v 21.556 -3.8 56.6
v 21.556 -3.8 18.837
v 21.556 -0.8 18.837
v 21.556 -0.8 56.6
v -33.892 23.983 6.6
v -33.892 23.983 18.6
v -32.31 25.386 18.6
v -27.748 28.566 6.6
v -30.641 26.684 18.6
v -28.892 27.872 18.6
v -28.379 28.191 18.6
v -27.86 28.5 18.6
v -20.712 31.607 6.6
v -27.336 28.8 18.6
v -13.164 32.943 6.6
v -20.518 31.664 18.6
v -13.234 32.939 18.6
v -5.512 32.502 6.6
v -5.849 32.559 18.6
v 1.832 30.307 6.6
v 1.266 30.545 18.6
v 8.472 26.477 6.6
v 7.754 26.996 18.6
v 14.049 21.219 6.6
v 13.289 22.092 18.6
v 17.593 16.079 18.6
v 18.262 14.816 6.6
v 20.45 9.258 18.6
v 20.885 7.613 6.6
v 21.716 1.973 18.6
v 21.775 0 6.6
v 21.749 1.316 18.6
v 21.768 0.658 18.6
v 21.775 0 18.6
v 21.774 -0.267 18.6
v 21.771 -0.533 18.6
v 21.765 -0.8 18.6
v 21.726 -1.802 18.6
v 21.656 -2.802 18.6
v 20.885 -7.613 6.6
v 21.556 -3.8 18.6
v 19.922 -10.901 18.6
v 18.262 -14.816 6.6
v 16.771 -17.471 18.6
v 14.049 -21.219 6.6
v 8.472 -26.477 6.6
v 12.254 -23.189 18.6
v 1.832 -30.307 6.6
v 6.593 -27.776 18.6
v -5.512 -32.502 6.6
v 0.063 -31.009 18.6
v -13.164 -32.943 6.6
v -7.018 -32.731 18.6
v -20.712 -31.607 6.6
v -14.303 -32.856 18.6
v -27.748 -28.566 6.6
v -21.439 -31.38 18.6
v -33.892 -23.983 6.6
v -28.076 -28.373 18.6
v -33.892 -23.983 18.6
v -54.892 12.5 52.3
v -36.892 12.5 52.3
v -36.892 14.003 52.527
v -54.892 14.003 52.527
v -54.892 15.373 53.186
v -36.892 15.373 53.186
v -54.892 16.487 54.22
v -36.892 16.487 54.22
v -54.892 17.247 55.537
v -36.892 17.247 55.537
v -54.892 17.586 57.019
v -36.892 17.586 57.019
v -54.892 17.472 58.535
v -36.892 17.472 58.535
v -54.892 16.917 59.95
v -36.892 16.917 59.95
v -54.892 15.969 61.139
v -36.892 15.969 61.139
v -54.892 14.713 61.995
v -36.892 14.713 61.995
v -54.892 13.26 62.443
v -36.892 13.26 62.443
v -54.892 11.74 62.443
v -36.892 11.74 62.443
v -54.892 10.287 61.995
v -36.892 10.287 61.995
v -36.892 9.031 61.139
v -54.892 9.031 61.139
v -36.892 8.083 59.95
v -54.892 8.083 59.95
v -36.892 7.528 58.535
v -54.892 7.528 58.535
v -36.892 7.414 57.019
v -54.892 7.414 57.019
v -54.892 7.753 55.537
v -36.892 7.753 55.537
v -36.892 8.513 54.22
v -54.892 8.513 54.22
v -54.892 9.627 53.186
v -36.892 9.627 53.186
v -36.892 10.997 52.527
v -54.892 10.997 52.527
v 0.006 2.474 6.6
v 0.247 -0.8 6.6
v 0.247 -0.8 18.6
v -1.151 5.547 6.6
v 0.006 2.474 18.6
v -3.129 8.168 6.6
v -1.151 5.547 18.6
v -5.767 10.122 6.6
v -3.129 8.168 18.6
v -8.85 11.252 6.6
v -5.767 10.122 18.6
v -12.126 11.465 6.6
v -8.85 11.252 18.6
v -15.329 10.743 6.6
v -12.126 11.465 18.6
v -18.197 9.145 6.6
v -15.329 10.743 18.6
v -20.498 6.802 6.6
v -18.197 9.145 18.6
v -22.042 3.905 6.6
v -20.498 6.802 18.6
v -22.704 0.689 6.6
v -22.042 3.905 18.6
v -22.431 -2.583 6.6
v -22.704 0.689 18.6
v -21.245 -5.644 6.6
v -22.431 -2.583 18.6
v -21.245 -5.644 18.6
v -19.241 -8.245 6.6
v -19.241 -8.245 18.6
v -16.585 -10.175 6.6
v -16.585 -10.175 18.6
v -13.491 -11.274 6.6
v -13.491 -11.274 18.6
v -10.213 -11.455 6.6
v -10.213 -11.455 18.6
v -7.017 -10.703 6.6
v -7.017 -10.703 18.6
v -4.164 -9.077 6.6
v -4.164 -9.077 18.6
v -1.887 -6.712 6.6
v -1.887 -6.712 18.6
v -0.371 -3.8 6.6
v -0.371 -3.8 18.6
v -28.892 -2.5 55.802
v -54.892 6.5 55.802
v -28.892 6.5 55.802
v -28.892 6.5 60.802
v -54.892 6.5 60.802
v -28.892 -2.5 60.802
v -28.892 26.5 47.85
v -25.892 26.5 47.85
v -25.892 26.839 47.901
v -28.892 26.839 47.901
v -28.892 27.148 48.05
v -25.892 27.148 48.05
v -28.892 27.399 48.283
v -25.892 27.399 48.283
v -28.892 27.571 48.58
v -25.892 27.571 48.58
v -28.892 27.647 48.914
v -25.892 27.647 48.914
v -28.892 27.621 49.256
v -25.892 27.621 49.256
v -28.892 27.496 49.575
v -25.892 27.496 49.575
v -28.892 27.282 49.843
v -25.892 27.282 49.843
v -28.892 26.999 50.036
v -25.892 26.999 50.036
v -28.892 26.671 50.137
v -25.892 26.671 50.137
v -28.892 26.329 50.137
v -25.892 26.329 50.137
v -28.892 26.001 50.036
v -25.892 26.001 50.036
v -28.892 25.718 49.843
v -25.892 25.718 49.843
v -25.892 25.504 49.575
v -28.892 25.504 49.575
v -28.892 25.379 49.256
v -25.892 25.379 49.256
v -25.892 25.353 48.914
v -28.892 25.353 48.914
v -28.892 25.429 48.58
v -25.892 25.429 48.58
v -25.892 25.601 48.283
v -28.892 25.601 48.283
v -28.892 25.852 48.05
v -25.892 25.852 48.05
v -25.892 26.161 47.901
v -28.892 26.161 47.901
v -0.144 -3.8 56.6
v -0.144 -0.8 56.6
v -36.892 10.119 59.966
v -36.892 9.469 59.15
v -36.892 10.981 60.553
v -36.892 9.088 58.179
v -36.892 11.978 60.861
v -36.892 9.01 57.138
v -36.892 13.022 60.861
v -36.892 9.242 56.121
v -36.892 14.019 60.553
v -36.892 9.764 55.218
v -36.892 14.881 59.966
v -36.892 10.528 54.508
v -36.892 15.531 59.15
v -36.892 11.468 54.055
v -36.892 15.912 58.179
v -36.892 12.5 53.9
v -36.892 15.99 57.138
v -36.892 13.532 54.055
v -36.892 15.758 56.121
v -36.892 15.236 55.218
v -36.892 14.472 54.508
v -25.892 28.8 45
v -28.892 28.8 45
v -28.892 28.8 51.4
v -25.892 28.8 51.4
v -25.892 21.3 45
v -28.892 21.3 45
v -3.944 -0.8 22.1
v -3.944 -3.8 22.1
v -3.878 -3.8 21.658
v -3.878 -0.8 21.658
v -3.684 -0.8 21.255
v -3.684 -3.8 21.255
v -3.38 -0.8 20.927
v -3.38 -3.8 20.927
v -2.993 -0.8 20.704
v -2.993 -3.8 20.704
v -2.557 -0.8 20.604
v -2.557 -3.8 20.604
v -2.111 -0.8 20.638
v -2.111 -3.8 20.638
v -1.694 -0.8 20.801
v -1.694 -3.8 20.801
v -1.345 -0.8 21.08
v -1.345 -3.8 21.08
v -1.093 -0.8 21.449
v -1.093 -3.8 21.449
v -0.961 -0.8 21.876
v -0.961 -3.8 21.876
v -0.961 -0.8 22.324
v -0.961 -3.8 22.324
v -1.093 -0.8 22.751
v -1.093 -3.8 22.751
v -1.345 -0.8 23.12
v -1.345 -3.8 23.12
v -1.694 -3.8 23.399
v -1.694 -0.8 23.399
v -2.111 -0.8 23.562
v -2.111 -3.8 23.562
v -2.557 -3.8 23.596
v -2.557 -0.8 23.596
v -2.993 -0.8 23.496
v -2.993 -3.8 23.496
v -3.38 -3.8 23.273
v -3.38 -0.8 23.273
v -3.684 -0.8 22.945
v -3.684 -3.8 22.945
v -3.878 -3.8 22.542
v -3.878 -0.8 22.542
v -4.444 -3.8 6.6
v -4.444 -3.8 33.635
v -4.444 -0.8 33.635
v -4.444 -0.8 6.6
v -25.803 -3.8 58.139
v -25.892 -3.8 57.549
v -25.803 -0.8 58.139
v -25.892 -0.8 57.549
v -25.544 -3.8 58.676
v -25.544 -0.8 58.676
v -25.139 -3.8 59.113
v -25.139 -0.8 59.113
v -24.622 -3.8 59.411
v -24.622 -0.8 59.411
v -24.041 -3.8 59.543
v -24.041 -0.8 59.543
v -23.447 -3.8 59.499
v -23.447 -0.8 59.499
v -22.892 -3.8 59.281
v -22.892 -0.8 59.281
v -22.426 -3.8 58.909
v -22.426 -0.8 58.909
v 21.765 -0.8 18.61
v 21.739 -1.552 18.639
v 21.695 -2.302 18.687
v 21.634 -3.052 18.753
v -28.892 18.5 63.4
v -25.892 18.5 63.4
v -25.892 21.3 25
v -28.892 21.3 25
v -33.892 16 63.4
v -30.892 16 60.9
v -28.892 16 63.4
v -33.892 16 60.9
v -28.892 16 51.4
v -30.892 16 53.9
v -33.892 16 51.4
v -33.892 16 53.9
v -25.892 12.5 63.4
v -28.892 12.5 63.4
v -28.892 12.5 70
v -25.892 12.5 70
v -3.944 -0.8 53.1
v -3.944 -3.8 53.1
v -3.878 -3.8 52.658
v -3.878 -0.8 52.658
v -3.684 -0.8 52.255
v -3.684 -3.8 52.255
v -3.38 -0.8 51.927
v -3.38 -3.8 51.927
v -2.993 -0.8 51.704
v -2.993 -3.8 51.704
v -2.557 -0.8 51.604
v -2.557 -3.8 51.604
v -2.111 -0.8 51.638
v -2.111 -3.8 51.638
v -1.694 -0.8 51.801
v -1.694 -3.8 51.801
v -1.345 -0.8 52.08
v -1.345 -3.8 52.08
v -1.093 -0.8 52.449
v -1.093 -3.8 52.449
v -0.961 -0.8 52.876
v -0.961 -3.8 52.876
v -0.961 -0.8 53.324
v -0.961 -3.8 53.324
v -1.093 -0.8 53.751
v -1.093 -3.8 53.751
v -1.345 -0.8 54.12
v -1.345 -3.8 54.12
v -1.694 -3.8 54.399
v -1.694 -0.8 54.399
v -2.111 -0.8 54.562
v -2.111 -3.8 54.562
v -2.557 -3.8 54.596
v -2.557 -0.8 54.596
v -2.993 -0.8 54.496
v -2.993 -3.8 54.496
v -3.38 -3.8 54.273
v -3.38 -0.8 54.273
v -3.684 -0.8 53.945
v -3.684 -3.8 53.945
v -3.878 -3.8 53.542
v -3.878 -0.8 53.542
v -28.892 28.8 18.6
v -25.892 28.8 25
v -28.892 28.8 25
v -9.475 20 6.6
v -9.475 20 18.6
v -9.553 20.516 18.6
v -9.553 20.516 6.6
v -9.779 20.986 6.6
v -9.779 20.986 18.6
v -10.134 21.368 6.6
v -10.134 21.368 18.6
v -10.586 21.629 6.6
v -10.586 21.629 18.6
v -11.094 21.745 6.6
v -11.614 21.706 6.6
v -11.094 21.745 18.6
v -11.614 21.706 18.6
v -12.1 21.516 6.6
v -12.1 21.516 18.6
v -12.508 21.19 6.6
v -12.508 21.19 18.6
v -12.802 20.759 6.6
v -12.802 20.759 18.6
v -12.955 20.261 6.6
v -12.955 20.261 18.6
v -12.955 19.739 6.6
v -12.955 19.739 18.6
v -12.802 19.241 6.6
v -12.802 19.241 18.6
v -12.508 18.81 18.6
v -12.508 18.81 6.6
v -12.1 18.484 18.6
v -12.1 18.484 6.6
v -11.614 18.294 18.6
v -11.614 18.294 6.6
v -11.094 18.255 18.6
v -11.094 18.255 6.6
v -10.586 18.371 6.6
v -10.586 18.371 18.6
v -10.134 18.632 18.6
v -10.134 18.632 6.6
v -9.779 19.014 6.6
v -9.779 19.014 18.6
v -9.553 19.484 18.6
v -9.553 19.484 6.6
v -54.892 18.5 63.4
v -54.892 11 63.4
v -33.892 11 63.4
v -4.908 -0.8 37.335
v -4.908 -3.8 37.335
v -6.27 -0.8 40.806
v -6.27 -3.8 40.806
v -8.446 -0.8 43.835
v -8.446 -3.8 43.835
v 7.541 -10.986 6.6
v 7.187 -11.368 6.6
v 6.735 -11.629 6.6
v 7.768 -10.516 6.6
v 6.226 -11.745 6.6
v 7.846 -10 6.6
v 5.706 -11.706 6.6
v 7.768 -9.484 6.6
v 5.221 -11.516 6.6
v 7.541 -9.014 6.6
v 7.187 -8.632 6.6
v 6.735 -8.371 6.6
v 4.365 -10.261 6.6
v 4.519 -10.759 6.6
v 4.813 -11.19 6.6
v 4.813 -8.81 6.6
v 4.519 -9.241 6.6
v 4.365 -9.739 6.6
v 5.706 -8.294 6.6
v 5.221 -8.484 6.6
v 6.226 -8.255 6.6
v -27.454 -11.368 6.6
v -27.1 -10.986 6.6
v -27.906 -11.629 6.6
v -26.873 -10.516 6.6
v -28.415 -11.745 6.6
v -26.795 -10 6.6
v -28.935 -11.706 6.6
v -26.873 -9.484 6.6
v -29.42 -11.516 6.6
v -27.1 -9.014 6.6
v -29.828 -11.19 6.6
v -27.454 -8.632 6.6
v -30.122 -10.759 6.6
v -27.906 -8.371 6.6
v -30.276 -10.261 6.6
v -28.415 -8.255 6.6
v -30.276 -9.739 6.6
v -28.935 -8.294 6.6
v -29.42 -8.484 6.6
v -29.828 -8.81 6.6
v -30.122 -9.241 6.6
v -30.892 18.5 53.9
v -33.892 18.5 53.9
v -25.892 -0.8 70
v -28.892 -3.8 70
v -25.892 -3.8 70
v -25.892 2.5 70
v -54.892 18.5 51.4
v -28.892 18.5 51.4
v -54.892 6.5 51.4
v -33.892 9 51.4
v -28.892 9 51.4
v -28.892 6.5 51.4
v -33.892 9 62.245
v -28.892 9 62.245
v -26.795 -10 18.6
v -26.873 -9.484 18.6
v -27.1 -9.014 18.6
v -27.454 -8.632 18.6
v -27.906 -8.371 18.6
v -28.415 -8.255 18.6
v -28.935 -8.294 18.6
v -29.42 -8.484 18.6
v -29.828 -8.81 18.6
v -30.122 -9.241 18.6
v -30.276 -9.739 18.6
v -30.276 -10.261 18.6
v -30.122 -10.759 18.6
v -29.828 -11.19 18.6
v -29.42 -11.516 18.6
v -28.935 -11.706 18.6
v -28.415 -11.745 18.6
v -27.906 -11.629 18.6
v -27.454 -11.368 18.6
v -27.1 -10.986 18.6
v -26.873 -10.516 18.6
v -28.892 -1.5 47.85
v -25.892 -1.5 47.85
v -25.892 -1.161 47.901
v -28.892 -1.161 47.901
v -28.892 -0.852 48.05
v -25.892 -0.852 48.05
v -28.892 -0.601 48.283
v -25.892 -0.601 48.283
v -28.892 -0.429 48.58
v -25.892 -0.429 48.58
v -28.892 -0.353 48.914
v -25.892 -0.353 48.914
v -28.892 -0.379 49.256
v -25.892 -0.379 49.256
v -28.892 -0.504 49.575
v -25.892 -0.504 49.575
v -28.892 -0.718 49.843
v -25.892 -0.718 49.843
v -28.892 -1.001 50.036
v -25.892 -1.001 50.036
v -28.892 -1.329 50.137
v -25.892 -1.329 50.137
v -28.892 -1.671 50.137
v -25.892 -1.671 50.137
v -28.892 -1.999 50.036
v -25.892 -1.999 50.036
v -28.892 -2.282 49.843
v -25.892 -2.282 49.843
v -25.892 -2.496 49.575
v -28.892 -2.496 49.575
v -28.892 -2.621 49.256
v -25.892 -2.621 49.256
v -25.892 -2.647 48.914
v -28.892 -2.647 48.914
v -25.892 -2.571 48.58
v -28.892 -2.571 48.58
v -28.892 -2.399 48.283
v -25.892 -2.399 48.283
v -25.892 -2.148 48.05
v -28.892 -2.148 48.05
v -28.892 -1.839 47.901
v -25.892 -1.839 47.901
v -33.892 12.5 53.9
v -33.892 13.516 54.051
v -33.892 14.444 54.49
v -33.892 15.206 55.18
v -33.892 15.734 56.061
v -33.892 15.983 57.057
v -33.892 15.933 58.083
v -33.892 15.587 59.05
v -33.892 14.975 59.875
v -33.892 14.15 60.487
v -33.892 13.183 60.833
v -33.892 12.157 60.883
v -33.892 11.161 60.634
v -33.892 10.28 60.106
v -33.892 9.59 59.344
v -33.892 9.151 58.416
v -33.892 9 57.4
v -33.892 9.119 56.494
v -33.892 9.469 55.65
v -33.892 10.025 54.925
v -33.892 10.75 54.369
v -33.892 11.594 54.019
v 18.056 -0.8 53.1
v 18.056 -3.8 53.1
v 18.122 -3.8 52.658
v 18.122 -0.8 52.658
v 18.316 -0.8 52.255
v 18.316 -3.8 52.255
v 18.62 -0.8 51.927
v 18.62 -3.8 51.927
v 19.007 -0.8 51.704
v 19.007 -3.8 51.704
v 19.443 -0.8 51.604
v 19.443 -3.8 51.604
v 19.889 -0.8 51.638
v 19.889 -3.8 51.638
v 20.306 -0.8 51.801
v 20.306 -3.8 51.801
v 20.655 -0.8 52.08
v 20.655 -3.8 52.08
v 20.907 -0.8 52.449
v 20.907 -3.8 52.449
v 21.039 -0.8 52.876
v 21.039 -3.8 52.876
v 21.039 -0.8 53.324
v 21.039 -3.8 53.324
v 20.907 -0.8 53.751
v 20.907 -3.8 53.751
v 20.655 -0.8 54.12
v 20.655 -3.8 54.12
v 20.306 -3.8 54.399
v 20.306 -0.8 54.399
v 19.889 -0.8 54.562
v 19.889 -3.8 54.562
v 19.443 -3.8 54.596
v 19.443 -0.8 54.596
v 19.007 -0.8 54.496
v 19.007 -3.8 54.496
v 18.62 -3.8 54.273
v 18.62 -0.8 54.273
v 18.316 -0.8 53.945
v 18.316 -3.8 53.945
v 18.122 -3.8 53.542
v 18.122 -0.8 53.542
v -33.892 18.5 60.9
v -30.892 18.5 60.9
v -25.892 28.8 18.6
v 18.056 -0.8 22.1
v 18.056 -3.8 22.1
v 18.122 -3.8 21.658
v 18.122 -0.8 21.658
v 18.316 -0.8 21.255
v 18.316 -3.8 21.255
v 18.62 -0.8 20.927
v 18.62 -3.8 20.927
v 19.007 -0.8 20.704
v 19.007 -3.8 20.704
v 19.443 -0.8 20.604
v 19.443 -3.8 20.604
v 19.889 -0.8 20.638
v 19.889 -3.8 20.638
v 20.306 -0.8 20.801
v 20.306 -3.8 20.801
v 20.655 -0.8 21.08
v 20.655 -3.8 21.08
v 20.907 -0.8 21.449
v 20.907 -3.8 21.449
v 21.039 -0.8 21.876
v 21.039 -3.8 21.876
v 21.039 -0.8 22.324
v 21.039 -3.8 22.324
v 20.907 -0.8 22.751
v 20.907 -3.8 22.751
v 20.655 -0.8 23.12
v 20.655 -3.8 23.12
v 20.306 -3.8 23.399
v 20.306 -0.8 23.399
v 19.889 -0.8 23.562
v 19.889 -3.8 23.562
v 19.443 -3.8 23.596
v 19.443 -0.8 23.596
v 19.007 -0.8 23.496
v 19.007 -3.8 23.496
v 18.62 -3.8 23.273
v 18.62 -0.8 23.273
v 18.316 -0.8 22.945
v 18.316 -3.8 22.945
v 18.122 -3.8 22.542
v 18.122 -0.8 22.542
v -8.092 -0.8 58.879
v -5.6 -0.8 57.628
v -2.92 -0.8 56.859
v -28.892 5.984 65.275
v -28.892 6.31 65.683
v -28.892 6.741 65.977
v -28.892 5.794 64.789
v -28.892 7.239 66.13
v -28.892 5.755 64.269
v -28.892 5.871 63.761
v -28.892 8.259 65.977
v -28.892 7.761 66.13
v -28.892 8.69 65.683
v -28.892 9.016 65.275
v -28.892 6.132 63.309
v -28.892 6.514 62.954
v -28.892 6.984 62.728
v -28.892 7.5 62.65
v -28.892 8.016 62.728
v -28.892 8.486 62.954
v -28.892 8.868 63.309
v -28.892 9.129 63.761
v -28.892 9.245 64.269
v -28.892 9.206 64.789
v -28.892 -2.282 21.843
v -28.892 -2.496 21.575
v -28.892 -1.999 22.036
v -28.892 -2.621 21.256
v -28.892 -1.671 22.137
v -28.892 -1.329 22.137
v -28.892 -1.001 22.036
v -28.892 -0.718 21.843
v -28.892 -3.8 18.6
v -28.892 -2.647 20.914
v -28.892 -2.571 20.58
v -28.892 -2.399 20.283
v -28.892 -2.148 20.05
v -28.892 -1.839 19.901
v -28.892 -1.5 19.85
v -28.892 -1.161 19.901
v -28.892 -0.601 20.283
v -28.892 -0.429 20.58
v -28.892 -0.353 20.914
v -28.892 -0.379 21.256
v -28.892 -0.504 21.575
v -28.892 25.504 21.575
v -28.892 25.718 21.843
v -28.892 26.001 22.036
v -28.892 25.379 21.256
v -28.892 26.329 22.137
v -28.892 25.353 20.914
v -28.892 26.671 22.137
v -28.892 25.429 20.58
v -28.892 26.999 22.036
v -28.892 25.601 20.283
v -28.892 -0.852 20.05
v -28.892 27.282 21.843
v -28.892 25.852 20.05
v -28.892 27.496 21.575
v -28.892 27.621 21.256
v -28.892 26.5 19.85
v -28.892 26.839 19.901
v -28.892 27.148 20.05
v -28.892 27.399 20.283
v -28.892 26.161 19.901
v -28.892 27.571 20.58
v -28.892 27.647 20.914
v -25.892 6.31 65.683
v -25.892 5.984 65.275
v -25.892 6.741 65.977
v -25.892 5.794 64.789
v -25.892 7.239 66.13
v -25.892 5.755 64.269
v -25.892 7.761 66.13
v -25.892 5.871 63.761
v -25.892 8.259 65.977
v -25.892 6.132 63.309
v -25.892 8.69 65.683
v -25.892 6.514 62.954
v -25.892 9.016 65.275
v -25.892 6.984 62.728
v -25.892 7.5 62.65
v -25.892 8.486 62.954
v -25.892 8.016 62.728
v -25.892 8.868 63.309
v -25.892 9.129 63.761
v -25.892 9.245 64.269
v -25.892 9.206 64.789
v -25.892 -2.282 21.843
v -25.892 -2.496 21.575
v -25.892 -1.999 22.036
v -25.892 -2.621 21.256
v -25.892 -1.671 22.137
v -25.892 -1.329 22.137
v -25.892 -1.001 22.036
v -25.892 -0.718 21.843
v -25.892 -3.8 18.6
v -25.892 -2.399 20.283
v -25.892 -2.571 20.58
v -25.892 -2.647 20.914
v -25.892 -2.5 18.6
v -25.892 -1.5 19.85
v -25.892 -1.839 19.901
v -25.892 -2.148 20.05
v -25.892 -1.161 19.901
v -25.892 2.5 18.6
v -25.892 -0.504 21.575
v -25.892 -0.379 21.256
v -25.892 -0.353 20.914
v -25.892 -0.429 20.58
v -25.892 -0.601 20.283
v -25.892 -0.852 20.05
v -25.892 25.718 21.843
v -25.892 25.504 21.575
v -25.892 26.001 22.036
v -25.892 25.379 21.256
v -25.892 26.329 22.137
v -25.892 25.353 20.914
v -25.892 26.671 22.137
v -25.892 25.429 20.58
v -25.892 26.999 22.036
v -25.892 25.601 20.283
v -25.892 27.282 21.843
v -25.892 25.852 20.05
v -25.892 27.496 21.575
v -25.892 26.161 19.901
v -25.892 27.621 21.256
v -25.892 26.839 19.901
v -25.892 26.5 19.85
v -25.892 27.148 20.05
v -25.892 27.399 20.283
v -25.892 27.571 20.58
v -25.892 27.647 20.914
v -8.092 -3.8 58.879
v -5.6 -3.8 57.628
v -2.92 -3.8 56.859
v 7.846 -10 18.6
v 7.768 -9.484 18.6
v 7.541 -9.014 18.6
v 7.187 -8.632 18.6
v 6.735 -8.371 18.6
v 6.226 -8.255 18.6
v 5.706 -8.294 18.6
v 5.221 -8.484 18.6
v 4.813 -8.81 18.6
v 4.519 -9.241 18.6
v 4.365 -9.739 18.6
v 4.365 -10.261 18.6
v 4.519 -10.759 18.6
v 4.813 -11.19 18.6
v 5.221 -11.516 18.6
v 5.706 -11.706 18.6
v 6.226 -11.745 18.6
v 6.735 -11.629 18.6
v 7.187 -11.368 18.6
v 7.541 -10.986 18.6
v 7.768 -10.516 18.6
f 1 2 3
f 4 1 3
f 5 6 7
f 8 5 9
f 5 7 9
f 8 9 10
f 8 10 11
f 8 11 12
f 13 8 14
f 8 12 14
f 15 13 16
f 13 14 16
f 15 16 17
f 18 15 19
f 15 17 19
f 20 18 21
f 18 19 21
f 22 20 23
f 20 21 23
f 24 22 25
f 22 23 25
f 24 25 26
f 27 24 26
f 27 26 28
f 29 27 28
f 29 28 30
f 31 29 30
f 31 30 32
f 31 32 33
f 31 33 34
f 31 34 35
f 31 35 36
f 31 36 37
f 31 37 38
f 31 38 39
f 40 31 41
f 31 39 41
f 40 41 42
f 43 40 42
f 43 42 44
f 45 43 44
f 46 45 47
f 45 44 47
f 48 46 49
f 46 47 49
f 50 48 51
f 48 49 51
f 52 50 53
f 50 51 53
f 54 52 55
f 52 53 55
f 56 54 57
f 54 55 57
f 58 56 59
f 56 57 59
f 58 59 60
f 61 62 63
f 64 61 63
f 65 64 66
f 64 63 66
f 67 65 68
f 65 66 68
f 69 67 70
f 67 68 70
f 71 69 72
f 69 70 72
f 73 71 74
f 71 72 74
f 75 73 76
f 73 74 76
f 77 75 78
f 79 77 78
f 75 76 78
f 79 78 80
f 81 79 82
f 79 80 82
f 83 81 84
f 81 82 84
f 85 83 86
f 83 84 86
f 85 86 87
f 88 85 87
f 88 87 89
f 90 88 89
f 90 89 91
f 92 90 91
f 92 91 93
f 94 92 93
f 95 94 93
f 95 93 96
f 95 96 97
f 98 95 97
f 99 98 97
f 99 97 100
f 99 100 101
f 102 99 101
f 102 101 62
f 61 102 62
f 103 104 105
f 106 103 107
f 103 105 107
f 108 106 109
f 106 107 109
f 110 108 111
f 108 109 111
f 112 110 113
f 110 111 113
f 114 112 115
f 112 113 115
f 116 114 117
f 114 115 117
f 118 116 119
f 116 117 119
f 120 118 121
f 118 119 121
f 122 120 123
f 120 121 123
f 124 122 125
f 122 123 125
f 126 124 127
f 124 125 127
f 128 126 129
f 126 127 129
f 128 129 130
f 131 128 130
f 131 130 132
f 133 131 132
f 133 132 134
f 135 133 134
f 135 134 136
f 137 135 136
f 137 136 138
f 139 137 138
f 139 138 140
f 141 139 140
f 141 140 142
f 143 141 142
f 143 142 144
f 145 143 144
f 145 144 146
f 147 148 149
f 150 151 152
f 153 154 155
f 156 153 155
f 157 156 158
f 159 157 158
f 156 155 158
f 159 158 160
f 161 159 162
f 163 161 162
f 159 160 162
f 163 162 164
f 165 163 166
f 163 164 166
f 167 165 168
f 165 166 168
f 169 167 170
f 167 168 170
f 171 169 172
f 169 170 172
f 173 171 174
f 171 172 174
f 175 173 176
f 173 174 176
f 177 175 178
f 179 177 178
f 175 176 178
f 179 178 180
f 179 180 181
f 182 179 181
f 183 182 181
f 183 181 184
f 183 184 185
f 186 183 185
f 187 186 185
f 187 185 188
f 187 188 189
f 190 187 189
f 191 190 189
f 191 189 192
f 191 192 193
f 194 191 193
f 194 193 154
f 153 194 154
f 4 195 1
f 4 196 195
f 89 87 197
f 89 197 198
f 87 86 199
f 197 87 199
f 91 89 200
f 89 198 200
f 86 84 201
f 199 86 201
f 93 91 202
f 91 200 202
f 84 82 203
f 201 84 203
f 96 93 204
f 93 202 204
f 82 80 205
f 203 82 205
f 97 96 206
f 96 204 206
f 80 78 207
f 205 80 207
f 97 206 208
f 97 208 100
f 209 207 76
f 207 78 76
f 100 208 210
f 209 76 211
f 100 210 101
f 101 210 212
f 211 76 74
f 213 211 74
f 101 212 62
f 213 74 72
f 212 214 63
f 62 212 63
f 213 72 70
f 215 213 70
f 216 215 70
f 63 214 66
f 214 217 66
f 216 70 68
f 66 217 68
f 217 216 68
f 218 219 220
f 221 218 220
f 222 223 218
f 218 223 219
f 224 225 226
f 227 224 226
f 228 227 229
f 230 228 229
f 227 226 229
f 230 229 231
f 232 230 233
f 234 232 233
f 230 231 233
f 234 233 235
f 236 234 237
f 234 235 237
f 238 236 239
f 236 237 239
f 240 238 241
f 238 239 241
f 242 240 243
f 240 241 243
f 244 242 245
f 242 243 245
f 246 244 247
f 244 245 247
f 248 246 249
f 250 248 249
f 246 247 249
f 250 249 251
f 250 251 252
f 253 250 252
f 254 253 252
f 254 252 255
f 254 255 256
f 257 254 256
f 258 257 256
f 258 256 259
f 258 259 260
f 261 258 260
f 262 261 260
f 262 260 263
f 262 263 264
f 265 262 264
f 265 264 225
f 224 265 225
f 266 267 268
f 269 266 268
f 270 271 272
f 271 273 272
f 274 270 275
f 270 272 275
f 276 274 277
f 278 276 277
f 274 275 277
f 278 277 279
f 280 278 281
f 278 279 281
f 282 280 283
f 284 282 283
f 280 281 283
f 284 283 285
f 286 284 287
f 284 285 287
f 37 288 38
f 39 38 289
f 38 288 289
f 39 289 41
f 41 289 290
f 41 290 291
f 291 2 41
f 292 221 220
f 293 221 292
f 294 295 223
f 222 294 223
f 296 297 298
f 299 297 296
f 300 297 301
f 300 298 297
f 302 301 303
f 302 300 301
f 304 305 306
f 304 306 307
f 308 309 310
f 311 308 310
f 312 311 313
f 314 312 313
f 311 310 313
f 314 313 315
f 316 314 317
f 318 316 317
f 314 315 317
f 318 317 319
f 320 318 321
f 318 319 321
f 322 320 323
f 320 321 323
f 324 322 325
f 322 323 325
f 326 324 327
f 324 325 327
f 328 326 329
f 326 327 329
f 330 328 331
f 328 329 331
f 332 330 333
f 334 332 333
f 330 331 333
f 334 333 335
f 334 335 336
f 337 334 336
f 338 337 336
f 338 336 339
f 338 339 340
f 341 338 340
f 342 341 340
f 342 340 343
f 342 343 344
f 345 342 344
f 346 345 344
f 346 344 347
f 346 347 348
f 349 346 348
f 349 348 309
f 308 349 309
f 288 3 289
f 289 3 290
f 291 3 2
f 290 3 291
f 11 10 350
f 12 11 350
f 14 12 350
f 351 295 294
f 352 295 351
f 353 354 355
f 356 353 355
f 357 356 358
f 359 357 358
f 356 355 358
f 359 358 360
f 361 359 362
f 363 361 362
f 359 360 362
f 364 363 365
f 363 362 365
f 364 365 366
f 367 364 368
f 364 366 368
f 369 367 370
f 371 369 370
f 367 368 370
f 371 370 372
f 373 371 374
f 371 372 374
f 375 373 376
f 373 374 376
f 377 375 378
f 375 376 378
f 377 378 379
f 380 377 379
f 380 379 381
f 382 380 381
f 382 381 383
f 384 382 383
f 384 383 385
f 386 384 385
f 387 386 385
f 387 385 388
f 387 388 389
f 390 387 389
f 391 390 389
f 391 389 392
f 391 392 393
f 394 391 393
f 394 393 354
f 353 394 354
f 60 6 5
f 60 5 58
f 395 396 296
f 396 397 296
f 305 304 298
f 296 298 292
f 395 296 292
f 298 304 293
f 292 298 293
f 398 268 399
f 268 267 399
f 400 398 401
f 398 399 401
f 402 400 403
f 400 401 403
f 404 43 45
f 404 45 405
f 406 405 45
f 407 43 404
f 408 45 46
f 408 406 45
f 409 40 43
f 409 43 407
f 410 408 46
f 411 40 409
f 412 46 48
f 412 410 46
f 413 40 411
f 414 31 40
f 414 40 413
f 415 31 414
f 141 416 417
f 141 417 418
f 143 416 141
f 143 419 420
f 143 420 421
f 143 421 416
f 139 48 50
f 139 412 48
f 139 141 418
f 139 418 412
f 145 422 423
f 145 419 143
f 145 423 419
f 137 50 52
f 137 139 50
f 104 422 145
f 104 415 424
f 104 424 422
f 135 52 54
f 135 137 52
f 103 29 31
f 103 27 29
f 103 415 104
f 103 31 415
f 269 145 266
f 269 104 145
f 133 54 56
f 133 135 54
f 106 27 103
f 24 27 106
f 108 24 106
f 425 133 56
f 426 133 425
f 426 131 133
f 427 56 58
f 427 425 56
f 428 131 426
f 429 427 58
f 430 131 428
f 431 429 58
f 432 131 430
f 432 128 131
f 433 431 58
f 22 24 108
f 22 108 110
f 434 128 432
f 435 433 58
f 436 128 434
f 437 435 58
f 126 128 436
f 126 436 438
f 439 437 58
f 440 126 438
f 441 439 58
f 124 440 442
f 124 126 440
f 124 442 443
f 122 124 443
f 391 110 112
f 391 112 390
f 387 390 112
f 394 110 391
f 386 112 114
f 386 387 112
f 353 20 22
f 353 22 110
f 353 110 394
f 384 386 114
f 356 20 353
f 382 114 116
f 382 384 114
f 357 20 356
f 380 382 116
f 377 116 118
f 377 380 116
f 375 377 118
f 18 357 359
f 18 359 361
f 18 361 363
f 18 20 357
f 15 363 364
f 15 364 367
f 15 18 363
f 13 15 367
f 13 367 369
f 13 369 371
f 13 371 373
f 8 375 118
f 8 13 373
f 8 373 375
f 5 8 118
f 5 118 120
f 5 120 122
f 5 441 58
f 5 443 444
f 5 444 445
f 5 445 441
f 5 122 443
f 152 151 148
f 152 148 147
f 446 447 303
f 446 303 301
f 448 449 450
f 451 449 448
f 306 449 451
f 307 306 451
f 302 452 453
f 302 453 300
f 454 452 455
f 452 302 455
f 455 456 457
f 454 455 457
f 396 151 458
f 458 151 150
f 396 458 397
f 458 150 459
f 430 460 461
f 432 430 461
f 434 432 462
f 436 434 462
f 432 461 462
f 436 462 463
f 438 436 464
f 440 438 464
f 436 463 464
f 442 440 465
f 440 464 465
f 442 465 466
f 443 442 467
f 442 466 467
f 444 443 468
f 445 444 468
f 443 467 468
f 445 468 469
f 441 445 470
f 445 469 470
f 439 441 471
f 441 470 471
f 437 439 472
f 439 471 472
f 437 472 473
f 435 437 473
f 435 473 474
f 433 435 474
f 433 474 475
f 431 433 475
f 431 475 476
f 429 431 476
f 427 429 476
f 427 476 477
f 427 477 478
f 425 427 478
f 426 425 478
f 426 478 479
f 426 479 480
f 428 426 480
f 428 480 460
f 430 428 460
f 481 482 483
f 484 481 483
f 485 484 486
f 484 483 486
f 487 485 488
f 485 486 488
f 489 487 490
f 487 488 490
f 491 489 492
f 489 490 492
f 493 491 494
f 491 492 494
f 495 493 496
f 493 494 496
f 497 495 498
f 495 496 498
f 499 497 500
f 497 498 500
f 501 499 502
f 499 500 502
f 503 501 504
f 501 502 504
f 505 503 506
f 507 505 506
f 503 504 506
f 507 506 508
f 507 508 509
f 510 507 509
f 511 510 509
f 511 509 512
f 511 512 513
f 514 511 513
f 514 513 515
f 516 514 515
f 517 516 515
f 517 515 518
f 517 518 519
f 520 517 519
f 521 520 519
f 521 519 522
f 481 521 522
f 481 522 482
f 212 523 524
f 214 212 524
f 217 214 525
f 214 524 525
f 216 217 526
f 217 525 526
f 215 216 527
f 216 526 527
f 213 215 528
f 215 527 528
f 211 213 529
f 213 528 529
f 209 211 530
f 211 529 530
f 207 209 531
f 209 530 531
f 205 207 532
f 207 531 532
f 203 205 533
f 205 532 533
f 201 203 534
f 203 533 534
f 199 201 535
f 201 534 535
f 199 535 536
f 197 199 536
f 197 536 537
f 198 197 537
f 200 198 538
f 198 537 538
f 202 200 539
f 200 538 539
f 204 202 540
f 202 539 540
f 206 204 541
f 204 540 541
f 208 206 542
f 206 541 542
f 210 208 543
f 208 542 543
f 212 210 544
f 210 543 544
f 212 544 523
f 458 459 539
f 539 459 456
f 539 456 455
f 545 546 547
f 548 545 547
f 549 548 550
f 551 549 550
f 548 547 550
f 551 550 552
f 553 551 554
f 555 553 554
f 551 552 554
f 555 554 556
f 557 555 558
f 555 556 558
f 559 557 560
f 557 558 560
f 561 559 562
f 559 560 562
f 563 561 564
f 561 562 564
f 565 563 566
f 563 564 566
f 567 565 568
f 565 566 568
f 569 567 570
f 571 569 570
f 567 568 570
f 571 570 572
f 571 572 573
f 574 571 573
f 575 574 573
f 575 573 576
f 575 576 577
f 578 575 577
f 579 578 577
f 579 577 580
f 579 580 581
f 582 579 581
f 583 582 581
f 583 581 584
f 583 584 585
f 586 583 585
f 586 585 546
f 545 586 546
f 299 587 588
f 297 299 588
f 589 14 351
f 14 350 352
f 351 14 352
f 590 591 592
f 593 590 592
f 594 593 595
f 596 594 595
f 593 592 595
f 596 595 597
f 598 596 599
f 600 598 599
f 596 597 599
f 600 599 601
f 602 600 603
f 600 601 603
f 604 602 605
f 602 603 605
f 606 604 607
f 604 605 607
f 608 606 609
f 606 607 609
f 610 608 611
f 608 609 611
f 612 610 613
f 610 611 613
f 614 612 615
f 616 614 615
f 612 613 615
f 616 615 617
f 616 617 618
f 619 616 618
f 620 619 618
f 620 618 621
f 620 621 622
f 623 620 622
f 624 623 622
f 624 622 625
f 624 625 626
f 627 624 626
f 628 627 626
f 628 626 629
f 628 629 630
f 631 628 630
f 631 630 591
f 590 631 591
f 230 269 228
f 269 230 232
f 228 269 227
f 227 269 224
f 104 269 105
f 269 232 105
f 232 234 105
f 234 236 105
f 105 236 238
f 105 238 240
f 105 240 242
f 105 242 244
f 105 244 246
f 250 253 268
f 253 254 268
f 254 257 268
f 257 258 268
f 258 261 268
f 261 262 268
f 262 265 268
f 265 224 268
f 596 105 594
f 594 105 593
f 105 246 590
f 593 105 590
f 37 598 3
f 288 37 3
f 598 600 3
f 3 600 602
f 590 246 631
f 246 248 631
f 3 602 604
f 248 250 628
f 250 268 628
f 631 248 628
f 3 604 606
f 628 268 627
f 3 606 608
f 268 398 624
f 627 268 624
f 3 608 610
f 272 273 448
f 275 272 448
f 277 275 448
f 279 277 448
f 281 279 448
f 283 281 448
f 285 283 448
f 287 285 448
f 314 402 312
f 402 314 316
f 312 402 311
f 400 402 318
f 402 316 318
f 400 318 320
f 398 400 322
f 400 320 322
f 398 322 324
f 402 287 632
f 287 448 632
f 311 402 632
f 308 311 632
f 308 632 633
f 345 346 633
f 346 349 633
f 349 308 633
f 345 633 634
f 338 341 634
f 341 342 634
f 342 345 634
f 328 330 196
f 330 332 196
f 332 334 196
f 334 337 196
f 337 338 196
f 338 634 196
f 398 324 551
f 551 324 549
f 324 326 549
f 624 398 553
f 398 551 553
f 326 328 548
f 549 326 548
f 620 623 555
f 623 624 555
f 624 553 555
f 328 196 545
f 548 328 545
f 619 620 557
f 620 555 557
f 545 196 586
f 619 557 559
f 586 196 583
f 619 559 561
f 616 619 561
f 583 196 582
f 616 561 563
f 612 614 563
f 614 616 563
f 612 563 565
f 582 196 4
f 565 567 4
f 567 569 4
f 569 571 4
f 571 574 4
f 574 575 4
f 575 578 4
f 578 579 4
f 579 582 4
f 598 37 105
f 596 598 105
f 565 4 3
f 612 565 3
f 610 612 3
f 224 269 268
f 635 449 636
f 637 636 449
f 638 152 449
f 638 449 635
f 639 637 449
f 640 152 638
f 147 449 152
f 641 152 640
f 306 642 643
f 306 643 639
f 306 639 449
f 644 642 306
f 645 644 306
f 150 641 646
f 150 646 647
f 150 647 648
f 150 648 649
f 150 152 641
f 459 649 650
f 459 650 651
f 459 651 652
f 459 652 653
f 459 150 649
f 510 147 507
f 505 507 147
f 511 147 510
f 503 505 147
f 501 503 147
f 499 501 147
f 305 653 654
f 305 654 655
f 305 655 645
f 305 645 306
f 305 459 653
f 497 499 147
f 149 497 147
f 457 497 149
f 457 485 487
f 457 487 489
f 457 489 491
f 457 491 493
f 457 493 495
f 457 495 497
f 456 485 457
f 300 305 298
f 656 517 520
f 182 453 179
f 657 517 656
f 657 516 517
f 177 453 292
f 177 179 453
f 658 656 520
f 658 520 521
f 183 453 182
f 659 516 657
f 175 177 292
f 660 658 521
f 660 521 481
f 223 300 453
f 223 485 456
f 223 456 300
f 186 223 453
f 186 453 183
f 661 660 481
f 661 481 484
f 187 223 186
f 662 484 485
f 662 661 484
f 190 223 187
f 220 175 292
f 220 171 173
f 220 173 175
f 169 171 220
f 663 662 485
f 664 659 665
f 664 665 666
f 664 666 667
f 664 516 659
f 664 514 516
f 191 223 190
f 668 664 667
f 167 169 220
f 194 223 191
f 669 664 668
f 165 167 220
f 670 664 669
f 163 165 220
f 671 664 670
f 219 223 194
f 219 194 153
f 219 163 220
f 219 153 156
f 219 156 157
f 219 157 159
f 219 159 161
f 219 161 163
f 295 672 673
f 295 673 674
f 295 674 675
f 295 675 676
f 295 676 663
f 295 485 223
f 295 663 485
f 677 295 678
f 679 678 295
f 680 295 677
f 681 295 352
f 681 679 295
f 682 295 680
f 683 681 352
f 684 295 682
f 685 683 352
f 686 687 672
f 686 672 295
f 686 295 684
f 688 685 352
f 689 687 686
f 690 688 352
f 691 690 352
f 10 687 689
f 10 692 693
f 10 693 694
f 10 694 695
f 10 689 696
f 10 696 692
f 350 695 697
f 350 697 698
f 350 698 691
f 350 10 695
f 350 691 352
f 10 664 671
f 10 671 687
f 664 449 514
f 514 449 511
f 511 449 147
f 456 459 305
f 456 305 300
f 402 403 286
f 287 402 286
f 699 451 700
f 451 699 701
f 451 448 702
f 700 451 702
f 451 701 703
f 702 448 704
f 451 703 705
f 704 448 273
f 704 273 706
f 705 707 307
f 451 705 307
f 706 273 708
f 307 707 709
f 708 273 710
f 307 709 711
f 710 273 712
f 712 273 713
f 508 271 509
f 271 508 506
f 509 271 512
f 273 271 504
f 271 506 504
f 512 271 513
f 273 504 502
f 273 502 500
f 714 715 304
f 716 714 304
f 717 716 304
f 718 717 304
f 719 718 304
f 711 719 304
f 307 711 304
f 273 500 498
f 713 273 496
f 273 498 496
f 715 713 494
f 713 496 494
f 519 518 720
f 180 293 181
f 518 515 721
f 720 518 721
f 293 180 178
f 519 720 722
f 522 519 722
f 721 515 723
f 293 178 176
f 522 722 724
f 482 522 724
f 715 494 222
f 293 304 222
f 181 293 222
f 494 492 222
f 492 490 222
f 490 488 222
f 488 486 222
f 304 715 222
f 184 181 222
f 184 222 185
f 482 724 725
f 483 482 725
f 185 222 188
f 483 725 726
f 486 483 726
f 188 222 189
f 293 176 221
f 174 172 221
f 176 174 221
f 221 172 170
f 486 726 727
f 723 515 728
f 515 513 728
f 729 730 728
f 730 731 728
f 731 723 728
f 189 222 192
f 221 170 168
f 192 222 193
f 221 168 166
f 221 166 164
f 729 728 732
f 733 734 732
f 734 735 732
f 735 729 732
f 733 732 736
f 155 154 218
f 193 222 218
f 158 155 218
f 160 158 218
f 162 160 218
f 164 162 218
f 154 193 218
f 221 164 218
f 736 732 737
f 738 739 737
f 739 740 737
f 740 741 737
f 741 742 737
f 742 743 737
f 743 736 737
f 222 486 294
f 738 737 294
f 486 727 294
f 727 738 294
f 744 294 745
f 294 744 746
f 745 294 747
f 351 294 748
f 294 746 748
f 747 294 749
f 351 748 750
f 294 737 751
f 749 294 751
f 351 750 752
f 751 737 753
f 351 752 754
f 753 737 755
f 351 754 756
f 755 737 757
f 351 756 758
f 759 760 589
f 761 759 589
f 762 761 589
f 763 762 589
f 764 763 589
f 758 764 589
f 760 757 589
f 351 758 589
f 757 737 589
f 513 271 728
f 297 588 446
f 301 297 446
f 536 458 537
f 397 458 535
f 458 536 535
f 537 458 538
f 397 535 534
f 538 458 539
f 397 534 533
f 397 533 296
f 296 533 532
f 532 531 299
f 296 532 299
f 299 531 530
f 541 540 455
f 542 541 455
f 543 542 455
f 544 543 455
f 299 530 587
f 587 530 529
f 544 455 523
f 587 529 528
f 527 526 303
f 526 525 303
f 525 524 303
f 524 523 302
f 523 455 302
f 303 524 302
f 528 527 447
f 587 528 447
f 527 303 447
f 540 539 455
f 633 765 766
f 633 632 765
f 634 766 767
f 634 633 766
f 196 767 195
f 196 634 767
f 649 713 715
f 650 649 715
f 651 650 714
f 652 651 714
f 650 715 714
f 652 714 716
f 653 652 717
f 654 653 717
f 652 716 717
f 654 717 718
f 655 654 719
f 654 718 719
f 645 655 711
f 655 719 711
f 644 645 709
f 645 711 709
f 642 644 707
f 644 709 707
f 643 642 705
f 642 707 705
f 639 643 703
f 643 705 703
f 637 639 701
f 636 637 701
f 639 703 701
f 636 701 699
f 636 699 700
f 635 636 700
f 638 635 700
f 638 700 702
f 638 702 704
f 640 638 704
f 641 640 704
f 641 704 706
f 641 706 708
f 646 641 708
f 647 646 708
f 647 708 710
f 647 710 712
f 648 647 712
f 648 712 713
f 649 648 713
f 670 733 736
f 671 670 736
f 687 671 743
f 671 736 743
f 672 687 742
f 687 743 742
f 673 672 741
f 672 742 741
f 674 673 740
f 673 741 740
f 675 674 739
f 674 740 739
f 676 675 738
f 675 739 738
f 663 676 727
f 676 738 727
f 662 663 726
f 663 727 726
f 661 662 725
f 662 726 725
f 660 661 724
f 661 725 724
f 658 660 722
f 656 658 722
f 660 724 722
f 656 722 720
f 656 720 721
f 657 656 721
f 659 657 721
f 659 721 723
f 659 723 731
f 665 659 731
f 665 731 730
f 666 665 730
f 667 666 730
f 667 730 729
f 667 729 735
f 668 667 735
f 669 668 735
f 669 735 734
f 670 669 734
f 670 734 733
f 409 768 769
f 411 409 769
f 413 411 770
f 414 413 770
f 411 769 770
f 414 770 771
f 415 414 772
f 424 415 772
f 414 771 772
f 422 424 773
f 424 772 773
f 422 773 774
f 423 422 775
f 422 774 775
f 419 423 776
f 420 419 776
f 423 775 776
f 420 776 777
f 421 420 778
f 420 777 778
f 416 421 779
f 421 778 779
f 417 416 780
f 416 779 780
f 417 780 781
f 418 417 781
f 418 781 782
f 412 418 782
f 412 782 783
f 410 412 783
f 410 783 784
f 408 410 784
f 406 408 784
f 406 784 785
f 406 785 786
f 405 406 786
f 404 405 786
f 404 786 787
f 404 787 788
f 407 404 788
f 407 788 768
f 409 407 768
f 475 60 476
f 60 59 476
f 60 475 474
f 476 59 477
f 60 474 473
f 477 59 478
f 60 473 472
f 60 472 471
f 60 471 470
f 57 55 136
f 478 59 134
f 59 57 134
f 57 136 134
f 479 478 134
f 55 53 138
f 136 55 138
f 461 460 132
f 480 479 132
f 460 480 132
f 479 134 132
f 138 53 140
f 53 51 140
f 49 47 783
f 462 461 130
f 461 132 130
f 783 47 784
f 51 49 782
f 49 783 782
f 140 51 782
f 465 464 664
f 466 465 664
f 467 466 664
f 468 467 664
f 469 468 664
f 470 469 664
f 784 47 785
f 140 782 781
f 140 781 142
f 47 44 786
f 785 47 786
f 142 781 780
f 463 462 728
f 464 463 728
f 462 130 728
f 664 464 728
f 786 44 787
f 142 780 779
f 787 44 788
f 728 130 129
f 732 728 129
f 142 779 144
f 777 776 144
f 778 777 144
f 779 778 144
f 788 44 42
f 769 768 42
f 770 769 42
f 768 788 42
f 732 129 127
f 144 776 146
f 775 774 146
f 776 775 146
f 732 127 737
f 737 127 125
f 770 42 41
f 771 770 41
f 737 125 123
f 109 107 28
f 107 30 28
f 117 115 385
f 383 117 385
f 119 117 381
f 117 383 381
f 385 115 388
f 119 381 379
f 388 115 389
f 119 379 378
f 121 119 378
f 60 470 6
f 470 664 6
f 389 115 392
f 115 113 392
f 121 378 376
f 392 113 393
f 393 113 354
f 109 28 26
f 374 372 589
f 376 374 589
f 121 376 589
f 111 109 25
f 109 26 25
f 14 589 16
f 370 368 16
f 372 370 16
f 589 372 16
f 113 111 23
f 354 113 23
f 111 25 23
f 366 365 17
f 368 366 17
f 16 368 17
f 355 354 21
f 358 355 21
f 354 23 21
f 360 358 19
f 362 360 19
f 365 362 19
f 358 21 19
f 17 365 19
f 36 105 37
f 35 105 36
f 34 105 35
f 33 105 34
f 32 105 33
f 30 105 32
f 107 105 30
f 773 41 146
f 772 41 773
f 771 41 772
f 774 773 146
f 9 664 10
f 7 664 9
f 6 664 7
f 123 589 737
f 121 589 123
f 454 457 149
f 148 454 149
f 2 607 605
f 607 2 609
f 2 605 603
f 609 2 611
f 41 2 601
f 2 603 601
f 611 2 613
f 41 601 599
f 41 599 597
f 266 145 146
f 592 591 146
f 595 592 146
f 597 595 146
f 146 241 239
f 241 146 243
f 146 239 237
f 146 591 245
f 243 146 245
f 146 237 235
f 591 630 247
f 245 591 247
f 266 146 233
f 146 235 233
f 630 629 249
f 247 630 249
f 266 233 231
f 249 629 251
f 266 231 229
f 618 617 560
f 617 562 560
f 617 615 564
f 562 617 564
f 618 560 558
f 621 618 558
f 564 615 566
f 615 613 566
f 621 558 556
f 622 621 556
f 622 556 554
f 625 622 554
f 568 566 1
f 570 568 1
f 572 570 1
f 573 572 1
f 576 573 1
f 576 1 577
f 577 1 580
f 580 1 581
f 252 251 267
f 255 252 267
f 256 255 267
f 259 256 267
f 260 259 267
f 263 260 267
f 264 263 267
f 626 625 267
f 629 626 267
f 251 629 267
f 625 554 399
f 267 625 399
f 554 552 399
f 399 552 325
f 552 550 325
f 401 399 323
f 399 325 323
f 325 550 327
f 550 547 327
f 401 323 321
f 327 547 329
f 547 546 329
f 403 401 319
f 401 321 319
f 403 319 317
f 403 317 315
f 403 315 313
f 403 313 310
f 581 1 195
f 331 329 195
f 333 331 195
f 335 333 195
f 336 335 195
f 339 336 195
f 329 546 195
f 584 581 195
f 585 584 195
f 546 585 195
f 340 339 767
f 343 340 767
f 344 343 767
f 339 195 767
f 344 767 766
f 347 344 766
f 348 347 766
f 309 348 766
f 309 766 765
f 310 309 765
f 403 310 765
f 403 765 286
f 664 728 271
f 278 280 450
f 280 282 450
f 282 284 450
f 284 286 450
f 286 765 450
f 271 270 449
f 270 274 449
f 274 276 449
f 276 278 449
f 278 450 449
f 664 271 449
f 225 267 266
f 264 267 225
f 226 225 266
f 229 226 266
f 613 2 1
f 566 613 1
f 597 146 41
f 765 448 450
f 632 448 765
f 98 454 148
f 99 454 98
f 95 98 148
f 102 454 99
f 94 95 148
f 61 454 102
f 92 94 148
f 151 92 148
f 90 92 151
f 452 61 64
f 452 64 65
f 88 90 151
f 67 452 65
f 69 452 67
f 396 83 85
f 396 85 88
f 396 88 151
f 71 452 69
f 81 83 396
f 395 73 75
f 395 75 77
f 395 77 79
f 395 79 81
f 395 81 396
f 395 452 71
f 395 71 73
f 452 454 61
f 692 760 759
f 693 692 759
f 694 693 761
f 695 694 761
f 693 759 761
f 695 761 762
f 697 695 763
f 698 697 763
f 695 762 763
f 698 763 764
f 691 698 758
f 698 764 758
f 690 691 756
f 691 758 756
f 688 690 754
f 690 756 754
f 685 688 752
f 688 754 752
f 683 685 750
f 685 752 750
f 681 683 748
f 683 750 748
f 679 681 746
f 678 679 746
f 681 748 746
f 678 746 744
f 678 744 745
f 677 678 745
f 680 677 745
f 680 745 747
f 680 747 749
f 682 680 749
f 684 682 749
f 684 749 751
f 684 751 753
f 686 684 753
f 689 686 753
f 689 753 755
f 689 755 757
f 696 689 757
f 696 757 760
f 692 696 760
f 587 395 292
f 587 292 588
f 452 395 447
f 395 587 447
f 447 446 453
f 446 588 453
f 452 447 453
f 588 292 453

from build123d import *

# Parameters (mm, degrees)
SKETCH_1_R           = 29
EXTRUDE_1_DEPTH      = 5
HOLE_WIZARD_1_D      = 3.5
HOLE_WIZARD_2_D      = 23
EXTRUDE_3_DEPTH      = 65
SKETCH_9_W           = 1
SKETCH_9_H           = 5
CUT_EXTRUDE_1_DEPTH  = 10
SKETCH_10_W          = 3
SKETCH_10_H          = 65
EXTRUDE_5_DEPTH      = 10
HOLE_WIZARD_3_D      = 3.5
EXTRUDE_START        = -65
EXTRUDE_6_DEPTH      = 65
SKETCH_22_W          = 12
SKETCH_22_H          = 6
EXTRUDE_7_DEPTH      = 3
EXTRUDE_8_DEPTH      = 8
HOLE_WIZARD_5_D      = 7
HOLE_WIZARD_5_DEPTH  = 3
SKETCH_27_W          = 5
SKETCH_27_H          = 3.5
CUT_EXTRUDE_3_DEPTH  = 70.598725899
CUT_EXTRUDE_4_REACH  = 94.289
SKETCH_28_W          = 3
SKETCH_28_H          = 3.5
SKETCH_29_R          = 3.5
EXTRUDE_9_DEPTH      = 18
HOLE_WIZARD_6_D      = 10.2
HOLE_WIZARD_6_DEPTH  = 18
SKETCH_32_W          = 26
SKETCH_32_H          = 5
EXTRUDE_10_DEPTH     = 9
CUT_EXTRUDE_5_REACH  = 88.897
SKETCH_36_W          = 32.8
SKETCH_36_H          = 32.6
EXTRUDE_12_DEPTH     = 3
SKETCH_38_R          = 29
CUT_EXTRUDE_7_DEPTH  = 5
SKETCH_39_W          = 17.667068266
SKETCH_39_H          = 15
CUT_EXTRUDE_8_DEPTH  = 13.6
SKETCH_41_R          = 33
EXTRUDE_14_DEPTH     = 12
HOLE_WIZARD_8_D      = 3.5
HOLE_WIZARD_9_D      = 23
HOLE_WIZARD_10_D     = 2.3
SKETCH_53_W          = 20
SKETCH_53_H          = 15
CUT_EXTRUDE_9_DEPTH  = 3
EXTRUDE_16_DEPTH     = 3
SKETCH_56_W          = 3.442096105
SKETCH_56_H          = 51.4
CUT_EXTRUDE_10_DEPTH = 96.777795528
SKETCH_57_W          = 3
SKETCH_57_H          = 1.3
EXTRUDE_17_DEPTH     = 18.6
EXTRUDE_18_DEPTH     = 3
CUT_EXTRUDE_START    = -12
CUT_EXTRUDE_11_DEPTH = 12
SKETCH_63_W          = 26
SKETCH_63_H          = 3
EXTRUDE_21_DEPTH     = 38
HOLE_WIZARD_11_D     = 3
EXTRUDE_22_DEPTH     = 3
CUT_EXTRUDE_START_2  = 4
CUT_EXTRUDE_13_DEPTH = 4
FILLET_1_R           = 15
FILLET_2_R           = 2
EXTRUDE_23_DEPTH     = 12


with BuildPart() as part:
    # 草图1 → 凸台-拉伸1 (new body)
    with BuildSketch(Plane.XY):
        Circle(SKETCH_1_R)
    extrude(amount=EXTRUDE_1_DEPTH)

    # 孔1 (through all)
    with Locations(Plane.XY.offset(5)):
        with Locations((0, 20), (-17.320508076, -10), (17.320508076, -10)):
            Hole(HOLE_WIZARD_1_D / 2)

    # 孔2 (through all)
    with Locations(Plane.XY.offset(5)):
        with Locations((0, 0)):
            Hole(HOLE_WIZARD_2_D / 2)

    # 草图7 → 凸台-拉伸3 (add)
    with BuildSketch(Plane.XY.offset(5)):
        with BuildLine():
            Line((-28.892040426, 2.5), (-28.892040426, -2.5))
            Line((-28.892040426, -2.5), (-11.22497216, -2.5))
            ThreePointArc((-11.22497216, -2.5), (-11.5, 0), (-11.22497216, 2.5))
            Line((-11.22497216, 2.5), (-28.892040426, 2.5))
        make_face()
    extrude(amount=EXTRUDE_3_DEPTH)

    # 草图9 → 切除-拉伸1 (cut)
    with BuildSketch(Plane.XY.offset(5)):
        with Locations((-29.392040426, 0)):
            Rectangle(SKETCH_9_W, SKETCH_9_H)
    extrude(amount=-CUT_EXTRUDE_1_DEPTH, mode=Mode.SUBTRACT)

    # 草图10 → 凸台-拉伸5 (add)
    with BuildSketch(Plane(origin=(0, 2.5, 0), x_dir=(1, 0, 0), z_dir=(0, 1, 0))):
        with Locations((-27.392040426, -37.5)):
            Rectangle(SKETCH_10_W, SKETCH_10_H)
    extrude(amount=EXTRUDE_5_DEPTH)

    # 孔3 (through all)
    with Locations(Plane.ZY.offset(28.892040426)):
        with Locations((10, 7.5), (64.4, 7.5)):
            Hole(HOLE_WIZARD_3_D / 2)

    # 草图20 → 凸台-拉伸6 (add)
    with BuildSketch(Plane.XY.offset(70).offset(EXTRUDE_START)):
        with BuildLine():
            Line((-11.22497216, 2.5), (-11.22497216, -2.5))
            ThreePointArc((-11.22497216, -2.5), (-11.5, 0), (-11.22497216, 2.5))
        make_face()
    extrude(amount=EXTRUDE_6_DEPTH)

    # 草图22 → 凸台-拉伸7 (add)
    with BuildSketch(Plane.ZY.offset(28.892040426)):
        with Locations((57.4, 15.5)):
            Rectangle(SKETCH_22_W, SKETCH_22_H)
    extrude(amount=-EXTRUDE_7_DEPTH)

    # 草图23 → 凸台-拉伸8 (add)
    with BuildSketch(Plane.ZY.offset(28.892040426)):
        Polygon((51.4, 6.5), (60.801923789, 6.5), (63.4, 11), (63.4, 12.5), (63.4, 18.5), (51.4, 18.5), (51.4, 12.5), align=None)
    extrude(amount=EXTRUDE_8_DEPTH)

    # 孔5
    with Locations(Plane.ZY.offset(36.892040426)):
        with Locations((57.4, 12.5)):
            Hole(HOLE_WIZARD_5_D / 2, depth=HOLE_WIZARD_5_DEPTH)

    # 草图27 → 切除-拉伸3 (cut, through all)
    with BuildSketch(Plane(origin=(0, 0, 51.4), x_dir=(-1, 0, 0), z_dir=(0, 0, -1))):
        with Locations((31.392040426, 14.25)):
            Rectangle(SKETCH_27_W, SKETCH_27_H)
        with Locations((31.392040426, 10.75)):
            Rectangle(SKETCH_27_W, SKETCH_27_H)
    extrude(amount=-CUT_EXTRUDE_3_DEPTH, mode=Mode.SUBTRACT)

    # 草图28 → 切除-拉伸4 (cut, up to next)
    with BuildSketch(Plane(origin=(0, 18.5, 0), x_dir=(1, 0, 0), z_dir=(0, 1, 0)), mode=Mode.PRIVATE) as cut_extrude_4_sk1:
        with Locations((-32.392040426, -59.15)):
            Rectangle(SKETCH_28_W, SKETCH_28_H)
    cut_extrude_4_tool1 = extrude(cut_extrude_4_sk1.sketch, amount=-CUT_EXTRUDE_4_REACH, mode=Mode.PRIVATE) & part.part
    # 草图28 → 切除-拉伸4 (cut, up to next)
    with BuildSketch(Plane(origin=(0, 18.5, 0), x_dir=(1, 0, 0), z_dir=(0, 1, 0)), mode=Mode.PRIVATE) as cut_extrude_4_sk2:
        with Locations((-32.392040426, -55.65)):
            Rectangle(SKETCH_28_W, SKETCH_28_H)
    cut_extrude_4_tool2 = extrude(cut_extrude_4_sk2.sketch, amount=-CUT_EXTRUDE_4_REACH, mode=Mode.PRIVATE) & part.part
    add(cut_extrude_4_tool1.solids().sort_by_distance((-32.39204, 18.5, 59.15))[0], mode=Mode.SUBTRACT)
    add(cut_extrude_4_tool2.solids().sort_by_distance((-32.39204, 18.5, 55.65))[0], mode=Mode.SUBTRACT)

    # 草图29 → 凸台-拉伸9 (add)
    # profile 1 of 2: a face of its own
    with BuildSketch(Plane.ZY.offset(36.892040426)):
        Polygon((60.801923789, 6.5), (63.4, 11), (63.4, 18.5), (51.4, 18.5), (51.4, 6.5), align=None)
        with Locations((57.4, 12.5)):
            Circle(SKETCH_29_R, mode=Mode.SUBTRACT)
    # profile 2 of 2: a face of its own
    with BuildSketch(Plane.ZY.offset(36.892040426)):
        with Locations((57.4, 12.5)):
            Circle(SKETCH_29_R)
    extrude(amount=EXTRUDE_9_DEPTH)

    # 孔6
    with Locations(Plane.ZY.offset(54.892040426)):
        with Locations((57.4, 12.5)):
            Hole(HOLE_WIZARD_6_D / 2, depth=HOLE_WIZARD_6_DEPTH)

    # 草图32 → 凸台-拉伸10 (add)
    with BuildSketch(Plane.XZ.offset(-6.5)):
        with Locations((-41.892040426, 58.301923789)):
            Rectangle(SKETCH_32_W, SKETCH_32_H)
    extrude(amount=EXTRUDE_10_DEPTH)

    # 草图33 → 切除-拉伸5 (cut, up to next)
    with BuildSketch(Plane.XY.offset(60.801923789), mode=Mode.PRIVATE) as cut_extrude_5_sk1:
        Polygon((-54.892040426, 6.5), (-28.892040426, -2.5), (-54.892040426, -2.5), align=None)
    cut_extrude_5_tool1 = extrude(cut_extrude_5_sk1.sketch, amount=-CUT_EXTRUDE_5_REACH, mode=Mode.PRIVATE) & part.part
    add(cut_extrude_5_tool1.solids().sort_by_distance((-46.225374, 0.5, 60.801924))[0], mode=Mode.SUBTRACT)

    # 草图36 → 凸台-拉伸12 (add)
    with BuildSketch(Plane.ZY.offset(28.892040426)):
        with Locations((35, 12.5)):
            Rectangle(SKETCH_36_W, SKETCH_36_H)
    extrude(amount=-EXTRUDE_12_DEPTH)

    # 草图38 → 切除-拉伸7 (cut)
    with BuildSketch(Plane(origin=(0, 0, 0), x_dir=(-1, 0, 0), z_dir=(0, 0, -1))):
        Circle(SKETCH_38_R)
    extrude(amount=-CUT_EXTRUDE_7_DEPTH, mode=Mode.SUBTRACT)

    # 草图39 → 切除-拉伸8 (cut)
    with BuildSketch(Plane(origin=(0, 0, 5), x_dir=(-1, 0, 0), z_dir=(0, 0, -1))):
        with Locations((20.058506293, 5)):
            Rectangle(SKETCH_39_W, SKETCH_39_H)
    extrude(amount=-CUT_EXTRUDE_8_DEPTH, mode=Mode.SUBTRACT)

    # 草图41 → 凸台-拉伸14 (add)
    with BuildSketch(Plane(origin=(0, 0, 18.6), x_dir=(-1, 0, 0), z_dir=(0, 0, -1))):
        with Locations(Location((11.22497216, 0, 0), (0, 0, 57.631283974))):
            Circle(SKETCH_41_R)
    extrude(amount=EXTRUDE_14_DEPTH)

    # 孔8 (through all)
    with Locations(Plane(origin=(0, 0, 6.6), x_dir=(-1, 0, 0), z_dir=(0, 0, -1))):
        with Locations((11.22497216, 20), (-6.095535915, -10), (28.545480236, -10)):
            Hole(HOLE_WIZARD_8_D / 2)

    # 孔9 (through all)
    with Locations(Plane(origin=(0, 0, 6.6), x_dir=(-1, 0, 0), z_dir=(0, 0, -1))):
        with Locations((11.22497216, 0)):
            Hole(HOLE_WIZARD_9_D / 2)

    # 孔10 (through all)
    with Locations(Plane.ZY.offset(28.892040426)):
        with Locations((21, 26.5), (49, 26.5), (49, -1.5), (21, -1.5)):
            Hole(HOLE_WIZARD_10_D / 2)

    # 草图53 → 切除-拉伸9 (cut)
    with BuildSketch(Plane.ZY.offset(28.892040426)):
        with Locations((35, 28.8)):
            Rectangle(SKETCH_53_W, SKETCH_53_H)
    extrude(amount=-CUT_EXTRUDE_9_DEPTH, mode=Mode.SUBTRACT)

    # 草图55 → 凸台-拉伸16 (add)
    with BuildSketch(Plane(origin=(-25.892040426, 0, 0), x_dir=(0, 0, -1), z_dir=(1, 0, 0))):
        Polygon((-51.4, 28.8), (-63.4, 18.5), (-51.4, 18.5), align=None)
    extrude(amount=-EXTRUDE_16_DEPTH)

    # 草图56 → 切除-拉伸10 (cut, through all)
    with BuildSketch(Plane(origin=(0, 2.5, 0), x_dir=(1, 0, 0), z_dir=(0, 1, 0))):
        with Locations((-24.170992373, -44.3)):
            Rectangle(SKETCH_56_W, SKETCH_56_H)
    extrude(amount=-CUT_EXTRUDE_10_DEPTH, mode=Mode.SUBTRACT)

    # 草图57 → 凸台-拉伸17 (add)
    with BuildSketch(Plane.XY.offset(51.4)):
        with Locations((-27.392040426, -3.15)):
            Rectangle(SKETCH_57_W, SKETCH_57_H)
    extrude(amount=EXTRUDE_17_DEPTH)

    # 草图58 → 凸台-拉伸18 (add)
    with BuildSketch(Plane.XZ.offset(3.8)):
        Polygon((-25.892040426, 70), (21.77502784, 18.6), (14.955892727, 18.6), (-25.892040426, 62.646840732), align=None)
    extrude(amount=-EXTRUDE_18_DEPTH)

    # 草图62 → 切除-拉伸11 (cut)
    with BuildSketch(Plane(origin=(0, 0, 6.6), x_dir=(-1, 0, 0), z_dir=(0, 0, -1)).offset(CUT_EXTRUDE_START)):
        Polygon((33.892040426, 193.306123394), (33.892040426, 23.983411272), (33.892040426, -23.983411272), (33.892040426, -193.306123394), (372.537464671, -193.306123394), (372.537464671, 193.306123394), align=None)
    extrude(amount=CUT_EXTRUDE_11_DEPTH, mode=Mode.SUBTRACT)

    # 草图63 → 凸台-拉伸21 (add)
    with BuildSketch(Plane.XY.offset(18.6)):
        with Locations((8.555509837, -2.3)):
            Rectangle(SKETCH_63_W, SKETCH_63_H)
    extrude(amount=EXTRUDE_21_DEPTH)

    # 孔11 (through all)
    with Locations(Plane(origin=(0, -0.8, 0), x_dir=(1, 0, 0), z_dir=(0, 1, 0))):
        with Locations((-2.444490163, -22.1), (19.555509837, -22.1), (-2.444490163, -53.1), (19.555509837, -53.1)):
            Hole(HOLE_WIZARD_11_D / 2)

    # 草图67 → 凸台-拉伸22 (add)
    with BuildSketch(Plane(origin=(0, -0.8, 0), x_dir=(1, 0, 0), z_dir=(0, 1, 0))):
        Polygon((-25.892040426, -70), (-4.444490163, -56.6), (-4.444490163, -46.872836454), align=None)
    extrude(amount=-EXTRUDE_22_DEPTH)

    # 草图68 → 切除-拉伸13 (cut)
    with BuildSketch(Plane.XY.offset(18.6).offset(CUT_EXTRUDE_START_2)):
        with BuildLine():
            ThreePointArc((21.555509837, -3.8), (21.498484695, -4.263258313), (21.434913054, -4.725663739))
            Line((21.434913054, -4.725663739), (29.536238519, -6.781789189))
            ThreePointArc((29.536238519, -6.781789189), (29.956240846, -3.402448529), (30.096559281, 0))
            ThreePointArc((30.096559281, 0), (30.084776458, 0.986726755), (30.049434711, 1.972890781))
            Line((30.049434711, 1.972890781), (21.716000836, 1.972890781))
            ThreePointArc((21.716000836, 1.972890781), (21.760267788, 0.9868868), (21.77502784, 0))
            ThreePointArc((21.77502784, 0), (21.772603152, -0.400029392), (21.765329445, -0.8))
            ThreePointArc((21.765329445, -0.8), (21.694611585, -2.30239138), (21.555509837, -3.8))
        make_face()
    extrude(amount=-CUT_EXTRUDE_13_DEPTH, mode=Mode.SUBTRACT)

    # 圆角1
    fillet_1_edges = [part.edges().sort_by_distance(p)[0] for p in [
        (-4.444490163, -2.3, 56.6),
        (-4.444490163, -2.3, 39.519677186),
    ]]
    fillet(fillet_1_edges, radius=FILLET_1_R)

    # 圆角2
    fillet_2_edges = [part.edges().sort_by_distance(p)[0] for p in [
        (-25.892040426, -2.3, 62.646840732),
    ]]
    fillet(fillet_2_edges, radius=FILLET_2_R)

    # 草图69 → 凸台-拉伸23 (add)
    with BuildSketch(Plane(origin=(0, 0, 18.6), x_dir=(-1, 0, 0), z_dir=(0, 0, -1))):
        with BuildLine():
            Line((4.444490163, -3.8), (4.444490163, -0.8))
            Line((4.444490163, -0.8), (-0.247168006, -0.8))
            ThreePointArc((-0.247168006, -0.8), (-0.038441417, -2.320671148), (0.370940651, -3.8))
            Line((0.370940651, -3.8), (4.444490163, -3.8))
        make_face()
    extrude(amount=EXTRUDE_23_DEPTH)


solid = part.part
